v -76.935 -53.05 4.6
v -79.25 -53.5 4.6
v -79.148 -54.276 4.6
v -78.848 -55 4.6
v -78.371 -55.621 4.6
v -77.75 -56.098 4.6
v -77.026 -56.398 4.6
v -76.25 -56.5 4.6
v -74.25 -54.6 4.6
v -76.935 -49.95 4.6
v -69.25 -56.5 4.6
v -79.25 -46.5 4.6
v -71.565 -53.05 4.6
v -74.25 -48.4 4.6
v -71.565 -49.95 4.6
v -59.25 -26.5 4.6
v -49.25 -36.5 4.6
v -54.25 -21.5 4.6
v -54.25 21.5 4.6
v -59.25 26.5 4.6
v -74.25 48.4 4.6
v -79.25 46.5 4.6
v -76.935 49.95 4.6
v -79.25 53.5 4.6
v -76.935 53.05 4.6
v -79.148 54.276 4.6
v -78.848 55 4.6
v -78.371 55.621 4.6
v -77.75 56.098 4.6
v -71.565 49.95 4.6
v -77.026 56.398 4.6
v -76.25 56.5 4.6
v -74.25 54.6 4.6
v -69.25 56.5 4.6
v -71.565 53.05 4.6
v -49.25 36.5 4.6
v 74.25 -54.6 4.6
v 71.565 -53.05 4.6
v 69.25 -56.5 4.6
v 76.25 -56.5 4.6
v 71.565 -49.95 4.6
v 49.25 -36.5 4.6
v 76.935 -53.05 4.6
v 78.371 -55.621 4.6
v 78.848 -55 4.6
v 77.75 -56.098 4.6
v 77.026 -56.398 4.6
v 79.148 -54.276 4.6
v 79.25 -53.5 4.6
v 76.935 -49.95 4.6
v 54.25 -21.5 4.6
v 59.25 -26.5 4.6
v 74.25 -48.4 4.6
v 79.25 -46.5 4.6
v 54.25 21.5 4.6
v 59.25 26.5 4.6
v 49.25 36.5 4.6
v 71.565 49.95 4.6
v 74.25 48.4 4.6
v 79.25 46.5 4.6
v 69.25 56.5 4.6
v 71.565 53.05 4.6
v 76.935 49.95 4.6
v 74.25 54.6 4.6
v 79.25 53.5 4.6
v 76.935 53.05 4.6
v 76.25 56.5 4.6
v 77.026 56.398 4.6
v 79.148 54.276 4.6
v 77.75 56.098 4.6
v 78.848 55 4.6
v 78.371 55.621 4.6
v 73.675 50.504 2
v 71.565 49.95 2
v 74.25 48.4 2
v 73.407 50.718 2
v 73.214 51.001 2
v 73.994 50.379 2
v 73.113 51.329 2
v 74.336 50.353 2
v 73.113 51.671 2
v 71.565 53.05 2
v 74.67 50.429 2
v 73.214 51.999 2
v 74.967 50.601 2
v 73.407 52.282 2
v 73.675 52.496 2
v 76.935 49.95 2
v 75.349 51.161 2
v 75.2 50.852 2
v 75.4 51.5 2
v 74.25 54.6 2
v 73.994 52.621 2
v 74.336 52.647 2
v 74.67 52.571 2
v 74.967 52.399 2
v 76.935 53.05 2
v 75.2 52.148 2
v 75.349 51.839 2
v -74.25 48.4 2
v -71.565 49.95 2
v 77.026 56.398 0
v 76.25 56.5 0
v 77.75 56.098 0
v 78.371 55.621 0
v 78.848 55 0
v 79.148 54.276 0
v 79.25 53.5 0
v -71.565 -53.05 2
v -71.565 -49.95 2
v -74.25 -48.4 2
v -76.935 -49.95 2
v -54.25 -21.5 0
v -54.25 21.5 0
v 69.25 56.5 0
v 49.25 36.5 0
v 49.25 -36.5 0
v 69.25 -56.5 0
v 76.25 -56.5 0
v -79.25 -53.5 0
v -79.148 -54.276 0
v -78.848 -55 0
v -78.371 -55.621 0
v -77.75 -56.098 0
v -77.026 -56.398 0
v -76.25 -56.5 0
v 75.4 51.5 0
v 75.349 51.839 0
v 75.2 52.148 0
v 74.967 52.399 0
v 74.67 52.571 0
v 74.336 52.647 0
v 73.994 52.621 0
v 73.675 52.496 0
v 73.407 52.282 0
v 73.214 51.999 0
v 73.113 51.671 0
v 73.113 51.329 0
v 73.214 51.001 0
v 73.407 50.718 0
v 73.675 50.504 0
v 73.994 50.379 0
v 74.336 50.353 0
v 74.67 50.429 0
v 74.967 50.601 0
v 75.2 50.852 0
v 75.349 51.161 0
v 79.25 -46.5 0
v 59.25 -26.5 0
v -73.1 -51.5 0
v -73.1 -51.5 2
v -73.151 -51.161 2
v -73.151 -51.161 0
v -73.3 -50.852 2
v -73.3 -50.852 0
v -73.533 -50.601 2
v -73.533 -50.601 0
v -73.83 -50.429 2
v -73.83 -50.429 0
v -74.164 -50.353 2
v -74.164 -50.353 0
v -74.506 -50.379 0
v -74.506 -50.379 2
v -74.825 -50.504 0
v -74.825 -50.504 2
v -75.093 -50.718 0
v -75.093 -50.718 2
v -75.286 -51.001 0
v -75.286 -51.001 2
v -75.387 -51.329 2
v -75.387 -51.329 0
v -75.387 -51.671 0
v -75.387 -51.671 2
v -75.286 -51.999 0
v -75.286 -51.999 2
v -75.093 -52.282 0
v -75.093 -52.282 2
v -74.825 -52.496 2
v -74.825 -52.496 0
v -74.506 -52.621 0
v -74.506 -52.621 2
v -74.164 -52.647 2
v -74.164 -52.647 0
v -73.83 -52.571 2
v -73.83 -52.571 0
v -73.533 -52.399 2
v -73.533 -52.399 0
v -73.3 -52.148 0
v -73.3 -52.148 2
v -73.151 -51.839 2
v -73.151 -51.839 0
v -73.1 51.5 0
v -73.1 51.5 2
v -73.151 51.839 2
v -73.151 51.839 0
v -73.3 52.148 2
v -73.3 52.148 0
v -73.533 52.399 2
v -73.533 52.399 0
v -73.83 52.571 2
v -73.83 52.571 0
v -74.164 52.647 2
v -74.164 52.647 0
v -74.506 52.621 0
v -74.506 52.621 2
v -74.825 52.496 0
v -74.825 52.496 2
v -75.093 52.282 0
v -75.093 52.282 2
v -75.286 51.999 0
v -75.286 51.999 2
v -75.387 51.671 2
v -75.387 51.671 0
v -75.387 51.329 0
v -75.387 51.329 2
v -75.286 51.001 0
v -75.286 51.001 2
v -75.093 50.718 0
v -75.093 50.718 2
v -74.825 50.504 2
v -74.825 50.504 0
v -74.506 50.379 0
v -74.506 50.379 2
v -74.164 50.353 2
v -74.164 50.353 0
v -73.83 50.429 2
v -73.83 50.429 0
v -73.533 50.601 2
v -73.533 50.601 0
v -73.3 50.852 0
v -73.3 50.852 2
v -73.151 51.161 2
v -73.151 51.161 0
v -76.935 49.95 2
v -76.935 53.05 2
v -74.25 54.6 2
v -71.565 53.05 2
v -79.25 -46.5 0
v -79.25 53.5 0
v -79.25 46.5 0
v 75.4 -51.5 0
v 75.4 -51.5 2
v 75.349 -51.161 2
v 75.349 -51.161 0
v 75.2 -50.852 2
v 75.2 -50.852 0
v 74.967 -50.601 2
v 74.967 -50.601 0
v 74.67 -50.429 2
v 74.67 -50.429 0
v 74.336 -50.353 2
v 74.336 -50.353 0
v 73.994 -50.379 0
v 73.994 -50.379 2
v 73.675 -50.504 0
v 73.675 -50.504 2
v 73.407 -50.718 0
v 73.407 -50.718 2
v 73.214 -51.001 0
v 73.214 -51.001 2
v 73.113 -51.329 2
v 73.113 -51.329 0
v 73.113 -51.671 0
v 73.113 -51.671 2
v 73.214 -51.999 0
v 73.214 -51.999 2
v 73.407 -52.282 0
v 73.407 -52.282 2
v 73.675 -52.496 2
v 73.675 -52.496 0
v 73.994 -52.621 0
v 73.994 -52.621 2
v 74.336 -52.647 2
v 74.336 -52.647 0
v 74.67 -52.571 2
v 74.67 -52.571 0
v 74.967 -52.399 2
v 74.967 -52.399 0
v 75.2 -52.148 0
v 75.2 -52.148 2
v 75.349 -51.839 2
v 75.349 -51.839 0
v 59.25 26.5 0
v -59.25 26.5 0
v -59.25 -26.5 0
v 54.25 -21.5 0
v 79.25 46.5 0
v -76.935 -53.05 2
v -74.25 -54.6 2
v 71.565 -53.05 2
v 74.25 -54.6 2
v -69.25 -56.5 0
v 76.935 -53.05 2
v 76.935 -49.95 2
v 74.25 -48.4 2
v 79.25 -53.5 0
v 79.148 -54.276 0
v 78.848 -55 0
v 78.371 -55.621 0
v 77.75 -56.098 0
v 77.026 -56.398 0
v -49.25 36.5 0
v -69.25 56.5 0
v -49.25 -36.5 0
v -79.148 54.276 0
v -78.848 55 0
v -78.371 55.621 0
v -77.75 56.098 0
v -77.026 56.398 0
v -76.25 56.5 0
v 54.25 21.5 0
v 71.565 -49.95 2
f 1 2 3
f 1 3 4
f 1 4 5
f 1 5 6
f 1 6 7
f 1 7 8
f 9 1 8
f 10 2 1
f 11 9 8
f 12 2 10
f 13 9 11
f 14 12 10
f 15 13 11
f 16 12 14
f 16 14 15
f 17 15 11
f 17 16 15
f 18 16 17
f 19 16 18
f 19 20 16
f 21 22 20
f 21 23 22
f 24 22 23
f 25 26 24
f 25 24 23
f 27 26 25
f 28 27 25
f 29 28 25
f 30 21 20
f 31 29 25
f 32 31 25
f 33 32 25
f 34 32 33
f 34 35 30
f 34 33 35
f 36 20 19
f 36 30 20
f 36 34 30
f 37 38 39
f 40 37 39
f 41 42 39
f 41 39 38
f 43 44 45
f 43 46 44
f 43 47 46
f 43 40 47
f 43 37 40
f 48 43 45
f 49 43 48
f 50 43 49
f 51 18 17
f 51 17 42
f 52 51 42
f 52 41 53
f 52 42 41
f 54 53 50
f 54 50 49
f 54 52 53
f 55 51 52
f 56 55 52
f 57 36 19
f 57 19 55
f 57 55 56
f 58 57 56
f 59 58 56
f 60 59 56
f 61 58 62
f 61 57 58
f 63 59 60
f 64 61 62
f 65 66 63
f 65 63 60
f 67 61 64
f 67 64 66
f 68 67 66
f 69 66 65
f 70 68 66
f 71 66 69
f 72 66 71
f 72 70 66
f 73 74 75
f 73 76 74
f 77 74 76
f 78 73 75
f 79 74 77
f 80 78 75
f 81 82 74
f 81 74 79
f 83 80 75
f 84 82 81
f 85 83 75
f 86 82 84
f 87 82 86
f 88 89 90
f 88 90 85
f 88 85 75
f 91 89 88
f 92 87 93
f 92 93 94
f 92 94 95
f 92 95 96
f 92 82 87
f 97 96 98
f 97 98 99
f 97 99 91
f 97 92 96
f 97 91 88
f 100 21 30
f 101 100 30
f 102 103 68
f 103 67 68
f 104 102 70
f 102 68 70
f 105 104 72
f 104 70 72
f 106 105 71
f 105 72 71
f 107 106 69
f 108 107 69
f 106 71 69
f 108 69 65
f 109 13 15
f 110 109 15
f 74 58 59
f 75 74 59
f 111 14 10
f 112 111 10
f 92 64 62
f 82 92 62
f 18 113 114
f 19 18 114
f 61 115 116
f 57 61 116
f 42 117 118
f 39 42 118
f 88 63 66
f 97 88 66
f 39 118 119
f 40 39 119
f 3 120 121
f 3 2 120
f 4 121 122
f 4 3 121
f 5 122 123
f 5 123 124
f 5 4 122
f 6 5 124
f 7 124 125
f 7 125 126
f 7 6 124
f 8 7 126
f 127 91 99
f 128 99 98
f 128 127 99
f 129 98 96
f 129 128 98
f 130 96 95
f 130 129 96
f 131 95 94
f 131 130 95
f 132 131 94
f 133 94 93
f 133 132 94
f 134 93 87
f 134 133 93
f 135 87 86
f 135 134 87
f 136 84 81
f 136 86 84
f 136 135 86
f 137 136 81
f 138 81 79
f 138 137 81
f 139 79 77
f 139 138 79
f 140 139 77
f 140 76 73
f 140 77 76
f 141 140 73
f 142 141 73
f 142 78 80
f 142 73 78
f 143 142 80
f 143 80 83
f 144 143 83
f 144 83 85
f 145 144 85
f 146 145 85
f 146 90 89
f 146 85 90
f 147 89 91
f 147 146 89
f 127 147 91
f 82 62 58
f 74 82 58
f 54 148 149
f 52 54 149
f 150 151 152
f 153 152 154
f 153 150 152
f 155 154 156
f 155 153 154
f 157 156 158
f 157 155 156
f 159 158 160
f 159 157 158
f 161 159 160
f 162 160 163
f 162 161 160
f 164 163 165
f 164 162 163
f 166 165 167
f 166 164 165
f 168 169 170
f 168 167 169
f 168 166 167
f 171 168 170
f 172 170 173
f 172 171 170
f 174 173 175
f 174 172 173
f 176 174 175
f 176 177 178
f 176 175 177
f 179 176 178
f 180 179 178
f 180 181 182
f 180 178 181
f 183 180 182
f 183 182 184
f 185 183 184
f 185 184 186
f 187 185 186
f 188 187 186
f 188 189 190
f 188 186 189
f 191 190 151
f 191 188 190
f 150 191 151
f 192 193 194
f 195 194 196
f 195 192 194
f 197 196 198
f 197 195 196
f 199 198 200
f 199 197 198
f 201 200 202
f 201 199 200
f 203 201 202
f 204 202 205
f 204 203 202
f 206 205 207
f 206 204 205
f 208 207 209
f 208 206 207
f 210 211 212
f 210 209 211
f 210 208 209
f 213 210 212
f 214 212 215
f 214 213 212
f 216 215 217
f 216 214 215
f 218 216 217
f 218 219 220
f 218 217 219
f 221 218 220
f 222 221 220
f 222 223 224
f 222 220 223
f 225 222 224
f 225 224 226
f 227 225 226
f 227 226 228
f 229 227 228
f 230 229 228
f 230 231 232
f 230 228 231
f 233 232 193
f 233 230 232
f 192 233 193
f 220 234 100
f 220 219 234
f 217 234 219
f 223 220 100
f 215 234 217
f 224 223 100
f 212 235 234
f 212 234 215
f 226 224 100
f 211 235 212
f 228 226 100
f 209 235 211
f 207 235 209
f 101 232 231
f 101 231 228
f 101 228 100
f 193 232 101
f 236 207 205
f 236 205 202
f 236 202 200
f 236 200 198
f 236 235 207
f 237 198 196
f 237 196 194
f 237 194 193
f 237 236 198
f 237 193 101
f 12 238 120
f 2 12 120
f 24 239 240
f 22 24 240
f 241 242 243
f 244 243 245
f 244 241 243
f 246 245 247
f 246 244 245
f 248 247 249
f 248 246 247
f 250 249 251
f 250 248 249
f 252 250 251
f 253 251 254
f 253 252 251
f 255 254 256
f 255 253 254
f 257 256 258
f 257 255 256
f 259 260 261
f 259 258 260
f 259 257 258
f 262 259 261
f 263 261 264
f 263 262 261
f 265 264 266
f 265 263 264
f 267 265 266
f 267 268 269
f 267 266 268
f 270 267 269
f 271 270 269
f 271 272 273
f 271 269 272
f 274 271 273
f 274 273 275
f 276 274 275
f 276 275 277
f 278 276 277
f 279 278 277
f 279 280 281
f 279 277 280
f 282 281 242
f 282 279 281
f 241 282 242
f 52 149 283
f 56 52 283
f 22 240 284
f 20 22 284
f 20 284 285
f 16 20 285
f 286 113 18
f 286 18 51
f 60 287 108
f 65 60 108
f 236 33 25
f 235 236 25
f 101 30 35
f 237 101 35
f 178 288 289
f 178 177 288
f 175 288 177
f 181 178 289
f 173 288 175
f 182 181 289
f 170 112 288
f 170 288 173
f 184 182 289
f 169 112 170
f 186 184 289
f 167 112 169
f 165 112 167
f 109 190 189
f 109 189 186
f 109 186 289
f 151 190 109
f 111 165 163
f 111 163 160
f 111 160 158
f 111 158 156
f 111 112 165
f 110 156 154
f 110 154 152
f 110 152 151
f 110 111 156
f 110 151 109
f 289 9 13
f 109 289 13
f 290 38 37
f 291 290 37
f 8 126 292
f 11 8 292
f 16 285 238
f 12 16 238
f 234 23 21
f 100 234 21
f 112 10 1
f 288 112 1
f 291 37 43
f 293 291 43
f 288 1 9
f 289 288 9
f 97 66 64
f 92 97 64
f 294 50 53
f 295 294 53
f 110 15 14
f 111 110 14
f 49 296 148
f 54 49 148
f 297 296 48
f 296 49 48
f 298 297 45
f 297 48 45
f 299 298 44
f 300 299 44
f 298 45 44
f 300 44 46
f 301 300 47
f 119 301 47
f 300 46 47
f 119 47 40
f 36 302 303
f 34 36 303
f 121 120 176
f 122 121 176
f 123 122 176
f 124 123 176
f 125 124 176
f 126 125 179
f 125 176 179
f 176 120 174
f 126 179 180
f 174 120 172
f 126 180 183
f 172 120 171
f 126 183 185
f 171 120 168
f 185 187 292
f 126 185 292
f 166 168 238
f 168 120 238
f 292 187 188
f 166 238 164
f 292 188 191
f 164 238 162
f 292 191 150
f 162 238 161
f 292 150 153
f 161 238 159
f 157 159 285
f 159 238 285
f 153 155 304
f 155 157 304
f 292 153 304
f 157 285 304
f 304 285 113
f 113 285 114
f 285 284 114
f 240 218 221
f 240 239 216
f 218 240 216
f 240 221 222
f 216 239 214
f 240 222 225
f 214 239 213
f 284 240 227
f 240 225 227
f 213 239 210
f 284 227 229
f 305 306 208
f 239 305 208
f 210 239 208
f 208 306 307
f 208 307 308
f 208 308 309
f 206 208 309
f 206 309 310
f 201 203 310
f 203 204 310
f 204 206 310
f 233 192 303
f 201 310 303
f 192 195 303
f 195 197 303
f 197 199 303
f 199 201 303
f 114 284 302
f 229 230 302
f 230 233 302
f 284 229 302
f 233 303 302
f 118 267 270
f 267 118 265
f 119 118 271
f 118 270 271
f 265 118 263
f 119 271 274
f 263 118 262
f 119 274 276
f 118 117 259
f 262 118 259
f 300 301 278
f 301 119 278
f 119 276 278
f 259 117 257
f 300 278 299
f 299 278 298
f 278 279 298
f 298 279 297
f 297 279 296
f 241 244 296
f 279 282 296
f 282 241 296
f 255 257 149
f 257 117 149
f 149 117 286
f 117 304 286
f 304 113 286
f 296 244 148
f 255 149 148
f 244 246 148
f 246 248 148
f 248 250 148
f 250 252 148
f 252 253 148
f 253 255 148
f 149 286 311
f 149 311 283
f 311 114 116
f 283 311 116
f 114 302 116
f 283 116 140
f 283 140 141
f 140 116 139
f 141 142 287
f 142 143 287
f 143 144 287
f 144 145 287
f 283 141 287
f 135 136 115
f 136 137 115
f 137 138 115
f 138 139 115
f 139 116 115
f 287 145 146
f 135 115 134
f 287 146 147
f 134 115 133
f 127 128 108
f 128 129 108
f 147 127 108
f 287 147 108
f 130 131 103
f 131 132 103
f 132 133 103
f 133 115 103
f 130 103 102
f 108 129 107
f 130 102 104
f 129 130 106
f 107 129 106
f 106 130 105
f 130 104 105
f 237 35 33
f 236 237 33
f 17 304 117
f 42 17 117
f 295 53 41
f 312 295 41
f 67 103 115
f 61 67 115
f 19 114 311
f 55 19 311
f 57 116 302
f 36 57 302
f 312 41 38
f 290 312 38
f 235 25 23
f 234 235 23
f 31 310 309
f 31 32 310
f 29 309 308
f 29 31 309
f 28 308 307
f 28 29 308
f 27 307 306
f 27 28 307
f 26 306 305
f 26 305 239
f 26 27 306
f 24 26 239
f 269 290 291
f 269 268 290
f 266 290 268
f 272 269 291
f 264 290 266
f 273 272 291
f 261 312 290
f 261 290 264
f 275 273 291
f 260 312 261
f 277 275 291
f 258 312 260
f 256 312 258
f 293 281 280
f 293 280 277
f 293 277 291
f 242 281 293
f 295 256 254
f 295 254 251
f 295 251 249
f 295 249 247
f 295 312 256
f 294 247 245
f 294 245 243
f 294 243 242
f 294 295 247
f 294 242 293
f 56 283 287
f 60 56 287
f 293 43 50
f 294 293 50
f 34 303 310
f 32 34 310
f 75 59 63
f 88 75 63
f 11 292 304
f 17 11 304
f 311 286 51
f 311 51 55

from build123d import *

# Parameters (mm, degrees)
SKETCH_R     = 1.15
SKETCH_W     = 108.5
SKETCH_H     = 43
PAD_DEPTH    = 4.6
FILLET_R     = 3
POCKET_DEPTH = 2.6


with BuildPart() as part:
    # Sketch → Pad (new body)
    with BuildSketch(Plane.XY):
        Polygon((-69.25, 56.5), (-79.25, 56.5), (-79.25, 46.5), (-59.25, 26.5), (-59.25, -26.5), (-79.25, -46.5), (-79.25, -56.5), (-69.25, -56.5), (-49.25, -36.5), (49.25, -36.5), (69.25, -56.5), (79.25, -56.5), (79.25, -46.5), (59.25, -26.5), (59.25, 26.5), (79.25, 46.5), (79.25, 56.5), (69.25, 56.5), (49.25, 36.5), (-49.25, 36.5), align=None)
        with Locations((-74.25, 51.5)):
            Circle(SKETCH_R, mode=Mode.SUBTRACT)
        with Locations((74.25, 51.5)):
            Circle(SKETCH_R, mode=Mode.SUBTRACT)
        with Locations((-74.25, -51.5)):
            Circle(SKETCH_R, mode=Mode.SUBTRACT)
        with Locations((74.25, -51.5)):
            Circle(SKETCH_R, mode=Mode.SUBTRACT)
        Rectangle(SKETCH_W, SKETCH_H, mode=Mode.SUBTRACT)
    extrude(amount=PAD_DEPTH)

    # Fillet
    fillet_edges = [part.edges().sort_by_distance(p)[0] for p in [
        (79.25, -56.5, 2.3),
        (79.25, 56.5, 2.3),
        (-79.25, 56.5, 2.3),
        (-79.25, -56.5, 2.3),
    ]]
    fillet(fillet_edges, radius=FILLET_R)

    # Sketch001 (on Face5 of Fillet) → Pocket (cut)
    with BuildSketch(Plane.XY.offset(4.6)):
        Polygon((-71.565321, 49.95), (-71.565321, 53.05), (-74.25, 54.6), (-76.934679, 53.05), (-76.934679, 49.95), (-74.25, 48.4), align=None)
        Polygon((-71.565321, -53.05), (-71.565321, -49.95), (-74.25, -48.4), (-76.934679, -49.95), (-76.934679, -53.05), (-74.25, -54.6), align=None)
        Polygon((76.934679, -53.05), (76.934679, -49.95), (74.25, -48.4), (71.565321, -49.95), (71.565321, -53.05), (74.25, -54.6), align=None)
        Polygon((76.934679, 49.95), (76.934679, 53.05), (74.25, 54.6), (71.565321, 53.05), (71.565321, 49.95), (74.25, 48.4), align=None)
    extrude(amount=-POCKET_DEPTH, mode=Mode.SUBTRACT)


solid = part.part
